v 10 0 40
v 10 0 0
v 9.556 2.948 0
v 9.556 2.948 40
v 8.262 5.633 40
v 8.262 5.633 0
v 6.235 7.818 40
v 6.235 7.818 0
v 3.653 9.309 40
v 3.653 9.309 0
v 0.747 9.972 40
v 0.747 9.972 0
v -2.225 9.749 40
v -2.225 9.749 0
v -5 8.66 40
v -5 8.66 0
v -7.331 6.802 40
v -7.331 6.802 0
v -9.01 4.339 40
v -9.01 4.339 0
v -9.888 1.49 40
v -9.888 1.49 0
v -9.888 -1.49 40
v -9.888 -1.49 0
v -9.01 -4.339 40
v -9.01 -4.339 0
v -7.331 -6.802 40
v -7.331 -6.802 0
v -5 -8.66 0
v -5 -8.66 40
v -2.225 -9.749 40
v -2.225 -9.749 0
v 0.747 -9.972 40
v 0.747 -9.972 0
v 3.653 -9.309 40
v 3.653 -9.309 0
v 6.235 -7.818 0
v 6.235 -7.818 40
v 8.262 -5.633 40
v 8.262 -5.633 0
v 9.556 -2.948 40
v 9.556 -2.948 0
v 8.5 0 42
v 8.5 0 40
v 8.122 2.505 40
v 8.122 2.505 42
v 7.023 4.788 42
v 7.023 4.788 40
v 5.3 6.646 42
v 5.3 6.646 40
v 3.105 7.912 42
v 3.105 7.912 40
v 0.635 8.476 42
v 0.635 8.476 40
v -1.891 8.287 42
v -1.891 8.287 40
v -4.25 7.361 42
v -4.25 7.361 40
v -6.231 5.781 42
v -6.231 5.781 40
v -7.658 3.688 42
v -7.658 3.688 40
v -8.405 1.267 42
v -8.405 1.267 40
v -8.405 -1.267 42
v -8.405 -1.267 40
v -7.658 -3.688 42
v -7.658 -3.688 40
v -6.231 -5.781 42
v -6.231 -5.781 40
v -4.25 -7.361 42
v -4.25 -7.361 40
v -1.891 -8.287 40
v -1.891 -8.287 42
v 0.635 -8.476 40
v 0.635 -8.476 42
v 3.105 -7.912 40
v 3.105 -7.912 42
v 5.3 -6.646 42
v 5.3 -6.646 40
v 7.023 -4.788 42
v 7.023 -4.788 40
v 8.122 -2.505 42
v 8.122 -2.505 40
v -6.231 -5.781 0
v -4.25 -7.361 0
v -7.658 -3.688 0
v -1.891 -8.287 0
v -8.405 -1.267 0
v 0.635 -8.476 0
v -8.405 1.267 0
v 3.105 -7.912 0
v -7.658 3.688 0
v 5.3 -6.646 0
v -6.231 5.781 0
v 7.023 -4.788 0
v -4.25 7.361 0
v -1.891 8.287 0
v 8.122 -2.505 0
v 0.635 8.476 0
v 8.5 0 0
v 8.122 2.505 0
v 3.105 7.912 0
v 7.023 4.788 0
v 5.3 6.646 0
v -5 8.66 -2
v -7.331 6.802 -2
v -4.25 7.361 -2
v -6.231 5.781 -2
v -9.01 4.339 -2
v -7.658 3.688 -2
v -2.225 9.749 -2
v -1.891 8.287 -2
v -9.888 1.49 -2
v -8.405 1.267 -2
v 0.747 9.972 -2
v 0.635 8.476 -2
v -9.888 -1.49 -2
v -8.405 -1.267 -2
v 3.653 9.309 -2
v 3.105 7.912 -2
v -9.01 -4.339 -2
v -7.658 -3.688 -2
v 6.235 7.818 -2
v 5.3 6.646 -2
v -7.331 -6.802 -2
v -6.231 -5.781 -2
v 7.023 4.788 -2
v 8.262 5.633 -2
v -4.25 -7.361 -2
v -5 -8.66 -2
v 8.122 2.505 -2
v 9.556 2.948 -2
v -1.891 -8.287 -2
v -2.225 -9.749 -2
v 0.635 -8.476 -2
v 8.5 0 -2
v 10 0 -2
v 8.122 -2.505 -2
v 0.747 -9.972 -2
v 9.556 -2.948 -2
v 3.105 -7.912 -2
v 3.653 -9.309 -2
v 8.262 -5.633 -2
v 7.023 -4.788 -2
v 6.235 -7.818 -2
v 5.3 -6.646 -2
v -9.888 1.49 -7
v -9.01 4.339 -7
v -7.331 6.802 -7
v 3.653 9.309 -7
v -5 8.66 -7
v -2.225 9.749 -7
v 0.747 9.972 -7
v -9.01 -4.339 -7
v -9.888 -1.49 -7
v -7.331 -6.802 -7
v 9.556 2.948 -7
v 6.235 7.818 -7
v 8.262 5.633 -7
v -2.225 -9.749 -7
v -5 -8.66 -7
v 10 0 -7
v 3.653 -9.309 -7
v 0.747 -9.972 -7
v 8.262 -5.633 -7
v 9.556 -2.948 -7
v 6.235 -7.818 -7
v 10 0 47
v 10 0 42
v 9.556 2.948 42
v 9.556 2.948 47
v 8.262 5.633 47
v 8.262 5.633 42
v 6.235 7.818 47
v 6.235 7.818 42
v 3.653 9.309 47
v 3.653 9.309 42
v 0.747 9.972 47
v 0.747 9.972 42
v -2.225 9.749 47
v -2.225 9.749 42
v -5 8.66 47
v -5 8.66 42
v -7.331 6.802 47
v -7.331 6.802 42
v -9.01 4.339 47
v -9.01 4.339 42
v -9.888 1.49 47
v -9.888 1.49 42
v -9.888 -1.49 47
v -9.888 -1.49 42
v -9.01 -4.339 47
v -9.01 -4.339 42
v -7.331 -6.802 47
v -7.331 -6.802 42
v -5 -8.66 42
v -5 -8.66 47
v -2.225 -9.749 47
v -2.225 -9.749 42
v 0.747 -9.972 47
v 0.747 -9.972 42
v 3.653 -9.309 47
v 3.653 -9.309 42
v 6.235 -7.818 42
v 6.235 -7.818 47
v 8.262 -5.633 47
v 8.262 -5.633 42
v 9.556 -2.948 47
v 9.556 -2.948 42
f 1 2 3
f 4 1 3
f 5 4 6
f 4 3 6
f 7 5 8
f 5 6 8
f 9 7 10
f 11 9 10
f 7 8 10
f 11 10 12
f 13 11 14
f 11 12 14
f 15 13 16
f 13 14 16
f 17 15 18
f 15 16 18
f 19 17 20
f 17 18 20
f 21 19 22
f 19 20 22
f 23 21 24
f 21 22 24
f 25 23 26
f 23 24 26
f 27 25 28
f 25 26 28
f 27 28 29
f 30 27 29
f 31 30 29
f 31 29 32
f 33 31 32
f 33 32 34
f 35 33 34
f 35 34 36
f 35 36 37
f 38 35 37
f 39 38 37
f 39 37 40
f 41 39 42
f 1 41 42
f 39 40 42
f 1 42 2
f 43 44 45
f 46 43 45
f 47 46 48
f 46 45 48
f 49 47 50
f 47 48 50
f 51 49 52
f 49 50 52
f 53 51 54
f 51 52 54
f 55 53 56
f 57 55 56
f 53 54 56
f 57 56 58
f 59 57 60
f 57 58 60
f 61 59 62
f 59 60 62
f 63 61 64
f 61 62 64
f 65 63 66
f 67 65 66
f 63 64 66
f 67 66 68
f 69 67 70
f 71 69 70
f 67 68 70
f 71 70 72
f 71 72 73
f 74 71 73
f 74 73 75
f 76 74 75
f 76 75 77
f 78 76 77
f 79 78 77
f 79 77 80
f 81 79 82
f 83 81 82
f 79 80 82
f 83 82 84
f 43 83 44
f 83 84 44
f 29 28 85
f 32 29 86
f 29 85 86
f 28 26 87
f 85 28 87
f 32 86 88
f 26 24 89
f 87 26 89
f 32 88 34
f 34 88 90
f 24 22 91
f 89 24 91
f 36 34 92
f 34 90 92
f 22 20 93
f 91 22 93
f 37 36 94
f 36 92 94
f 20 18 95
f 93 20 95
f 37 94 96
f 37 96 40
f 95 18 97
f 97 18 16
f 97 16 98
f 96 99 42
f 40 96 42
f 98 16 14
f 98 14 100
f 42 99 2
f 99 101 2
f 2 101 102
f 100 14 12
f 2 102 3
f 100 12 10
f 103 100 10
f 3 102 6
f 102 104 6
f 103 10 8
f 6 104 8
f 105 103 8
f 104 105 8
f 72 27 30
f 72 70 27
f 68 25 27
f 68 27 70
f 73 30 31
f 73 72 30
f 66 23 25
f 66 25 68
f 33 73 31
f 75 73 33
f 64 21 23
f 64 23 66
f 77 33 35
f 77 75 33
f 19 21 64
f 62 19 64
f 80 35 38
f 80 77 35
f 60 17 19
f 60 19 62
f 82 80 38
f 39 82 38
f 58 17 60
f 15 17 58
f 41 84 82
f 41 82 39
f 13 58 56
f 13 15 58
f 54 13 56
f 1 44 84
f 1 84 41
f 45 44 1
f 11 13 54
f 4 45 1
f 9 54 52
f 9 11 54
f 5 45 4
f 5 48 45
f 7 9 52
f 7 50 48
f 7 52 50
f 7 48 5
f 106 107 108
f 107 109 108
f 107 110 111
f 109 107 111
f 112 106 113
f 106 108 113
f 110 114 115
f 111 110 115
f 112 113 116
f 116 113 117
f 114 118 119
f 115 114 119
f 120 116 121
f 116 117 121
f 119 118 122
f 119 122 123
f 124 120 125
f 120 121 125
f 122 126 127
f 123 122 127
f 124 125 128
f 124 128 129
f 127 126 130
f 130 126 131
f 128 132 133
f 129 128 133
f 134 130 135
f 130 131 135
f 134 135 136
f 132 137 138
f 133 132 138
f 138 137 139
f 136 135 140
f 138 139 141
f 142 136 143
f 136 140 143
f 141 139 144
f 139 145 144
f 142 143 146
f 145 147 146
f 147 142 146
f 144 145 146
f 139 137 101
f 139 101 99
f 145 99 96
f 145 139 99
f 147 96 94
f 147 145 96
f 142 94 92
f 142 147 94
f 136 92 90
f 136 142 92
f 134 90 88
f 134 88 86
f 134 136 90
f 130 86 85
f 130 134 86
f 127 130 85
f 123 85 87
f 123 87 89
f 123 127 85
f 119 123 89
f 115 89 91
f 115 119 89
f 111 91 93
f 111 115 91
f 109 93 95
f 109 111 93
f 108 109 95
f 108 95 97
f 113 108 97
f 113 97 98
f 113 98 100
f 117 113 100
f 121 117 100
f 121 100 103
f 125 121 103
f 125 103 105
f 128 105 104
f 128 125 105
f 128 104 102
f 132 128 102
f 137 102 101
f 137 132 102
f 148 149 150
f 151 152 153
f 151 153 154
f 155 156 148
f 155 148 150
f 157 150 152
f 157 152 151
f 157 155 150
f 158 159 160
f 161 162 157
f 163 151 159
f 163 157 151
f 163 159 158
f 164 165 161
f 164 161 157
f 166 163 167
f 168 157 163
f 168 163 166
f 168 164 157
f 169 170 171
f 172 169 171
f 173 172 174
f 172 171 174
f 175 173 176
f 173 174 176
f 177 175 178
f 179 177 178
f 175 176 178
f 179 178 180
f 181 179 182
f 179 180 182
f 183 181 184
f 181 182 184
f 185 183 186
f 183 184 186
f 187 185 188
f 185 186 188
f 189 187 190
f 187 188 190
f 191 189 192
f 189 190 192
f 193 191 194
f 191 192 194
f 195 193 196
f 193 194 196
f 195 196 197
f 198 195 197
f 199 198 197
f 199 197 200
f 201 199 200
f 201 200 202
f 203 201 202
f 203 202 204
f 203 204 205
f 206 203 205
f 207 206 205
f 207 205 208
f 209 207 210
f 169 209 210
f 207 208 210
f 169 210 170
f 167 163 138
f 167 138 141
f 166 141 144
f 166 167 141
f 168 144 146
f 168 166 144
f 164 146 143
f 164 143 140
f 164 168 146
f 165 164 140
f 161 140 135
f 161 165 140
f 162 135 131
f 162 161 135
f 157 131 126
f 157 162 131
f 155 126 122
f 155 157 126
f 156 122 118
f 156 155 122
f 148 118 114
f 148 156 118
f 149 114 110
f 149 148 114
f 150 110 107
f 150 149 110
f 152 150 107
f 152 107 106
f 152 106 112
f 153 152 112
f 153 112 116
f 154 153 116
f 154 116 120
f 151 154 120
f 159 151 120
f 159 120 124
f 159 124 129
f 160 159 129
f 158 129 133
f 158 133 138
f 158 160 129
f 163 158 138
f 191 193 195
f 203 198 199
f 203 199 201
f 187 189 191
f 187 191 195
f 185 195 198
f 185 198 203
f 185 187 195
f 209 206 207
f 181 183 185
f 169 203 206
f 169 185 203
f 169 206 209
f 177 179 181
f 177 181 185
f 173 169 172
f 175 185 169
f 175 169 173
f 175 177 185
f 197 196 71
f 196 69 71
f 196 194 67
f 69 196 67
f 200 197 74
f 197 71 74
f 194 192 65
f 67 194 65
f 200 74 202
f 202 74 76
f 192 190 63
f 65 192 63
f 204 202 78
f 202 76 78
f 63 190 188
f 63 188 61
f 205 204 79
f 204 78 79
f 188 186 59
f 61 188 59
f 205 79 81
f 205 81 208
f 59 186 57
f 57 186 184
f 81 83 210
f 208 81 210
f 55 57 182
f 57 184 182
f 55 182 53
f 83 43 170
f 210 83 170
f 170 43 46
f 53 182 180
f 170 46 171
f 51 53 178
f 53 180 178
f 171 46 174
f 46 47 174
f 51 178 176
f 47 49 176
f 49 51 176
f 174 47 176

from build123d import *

# Parameters (mm, degrees)
SKETCH1_R           = 10
BOSS_EXTRUDE1_DEPTH = 40
SKETCH2_R           = 8.5
BOSS_EXTRUDE2_DEPTH = 2
SKETCH4_R           = 10
BOSS_EXTRUDE3_DEPTH = 5
BOSS_EXTRUDE4_START = 2
SKETCH5_R           = 8.5
BOSS_EXTRUDE4_DEPTH = 2
BOSS_EXTRUDE5_START = 5
SKETCH6_R           = 10
BOSS_EXTRUDE5_DEPTH = 5


with BuildPart() as part:
    # Sketch1 → Boss-Extrude1 (new body)
    with BuildSketch(Plane.XY):
        Circle(SKETCH1_R)
    extrude(amount=BOSS_EXTRUDE1_DEPTH)

    # Sketch2 → Boss-Extrude2 (add)
    with BuildSketch(Plane.XY.offset(40)):
        Circle(SKETCH2_R)
    extrude(amount=BOSS_EXTRUDE2_DEPTH)

    # Sketch4 → Boss-Extrude3 (add)
    with BuildSketch(Plane.XY.offset(42)):
        Circle(SKETCH4_R)
    extrude(amount=BOSS_EXTRUDE3_DEPTH)

    # Sketch5 → Boss-Extrude4 (add)
    with BuildSketch(Plane(origin=(0, 0, 0), x_dir=(-1, 0, 0), z_dir=(0, 0, -1)).offset(BOSS_EXTRUDE4_START)):
        with Locations(Location((0, 0, 0), (0, 0, 180))):
            Circle(SKETCH5_R)
    extrude(amount=-BOSS_EXTRUDE4_DEPTH)

    # Sketch6 → Boss-Extrude5 (add)
    with BuildSketch(Plane(origin=(0, 0, -2), x_dir=(-1, 0, 0), z_dir=(0, 0, -1)).offset(BOSS_EXTRUDE5_START)):
        with Locations(Location((0, 0, 0), (0, 0, 180))):
            Circle(SKETCH6_R)
    extrude(amount=-BOSS_EXTRUDE5_DEPTH)


solid = part.part
